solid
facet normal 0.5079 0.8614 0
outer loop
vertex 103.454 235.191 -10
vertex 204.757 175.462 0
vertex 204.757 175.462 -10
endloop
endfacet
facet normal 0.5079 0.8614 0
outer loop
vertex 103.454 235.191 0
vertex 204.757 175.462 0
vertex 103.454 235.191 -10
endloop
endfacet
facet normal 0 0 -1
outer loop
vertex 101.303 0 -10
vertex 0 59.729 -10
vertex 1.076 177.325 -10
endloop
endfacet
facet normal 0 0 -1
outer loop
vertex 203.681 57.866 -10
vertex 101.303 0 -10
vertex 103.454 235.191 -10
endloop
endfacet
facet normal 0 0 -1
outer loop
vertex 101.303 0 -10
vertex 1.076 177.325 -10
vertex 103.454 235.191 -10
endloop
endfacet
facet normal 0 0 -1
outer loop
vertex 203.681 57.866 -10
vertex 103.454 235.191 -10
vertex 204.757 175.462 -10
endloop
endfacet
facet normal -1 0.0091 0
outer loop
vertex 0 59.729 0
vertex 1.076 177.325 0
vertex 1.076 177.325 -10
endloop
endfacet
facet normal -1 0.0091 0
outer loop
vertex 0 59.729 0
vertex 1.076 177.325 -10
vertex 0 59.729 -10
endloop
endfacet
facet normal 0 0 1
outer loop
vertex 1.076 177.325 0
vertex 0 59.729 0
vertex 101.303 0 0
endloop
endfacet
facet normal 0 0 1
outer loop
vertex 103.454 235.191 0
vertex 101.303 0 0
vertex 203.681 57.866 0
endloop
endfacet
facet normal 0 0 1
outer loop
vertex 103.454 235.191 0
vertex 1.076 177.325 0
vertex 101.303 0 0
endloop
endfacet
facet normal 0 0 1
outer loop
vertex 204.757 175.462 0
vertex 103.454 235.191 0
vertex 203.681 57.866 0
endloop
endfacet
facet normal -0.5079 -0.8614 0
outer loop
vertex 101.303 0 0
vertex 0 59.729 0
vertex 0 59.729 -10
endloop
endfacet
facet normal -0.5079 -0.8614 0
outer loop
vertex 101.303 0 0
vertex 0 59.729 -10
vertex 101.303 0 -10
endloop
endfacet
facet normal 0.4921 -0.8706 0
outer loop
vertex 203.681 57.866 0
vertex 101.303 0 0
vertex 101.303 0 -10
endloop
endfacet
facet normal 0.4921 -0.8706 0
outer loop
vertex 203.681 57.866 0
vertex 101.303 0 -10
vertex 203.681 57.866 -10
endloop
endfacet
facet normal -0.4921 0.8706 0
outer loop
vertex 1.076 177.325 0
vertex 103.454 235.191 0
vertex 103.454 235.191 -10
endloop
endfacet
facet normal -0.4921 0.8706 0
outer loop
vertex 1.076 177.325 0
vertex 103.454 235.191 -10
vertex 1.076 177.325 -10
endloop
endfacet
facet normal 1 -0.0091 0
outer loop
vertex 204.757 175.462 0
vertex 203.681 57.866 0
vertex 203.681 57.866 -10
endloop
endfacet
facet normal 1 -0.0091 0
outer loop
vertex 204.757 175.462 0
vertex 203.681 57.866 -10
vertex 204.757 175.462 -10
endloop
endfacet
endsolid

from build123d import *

# Parameters (mm, degrees)
PAD013_DEPTH = 10


with BuildPart() as part:
    # Sketch013 → Pad013 (new body)
    with BuildSketch(Plane.XY):
        Polygon((40.648041, 7.960721), (-60.654729, 67.690055), (-163.033235, 9.82395), (-164.108971, -107.771489), (-62.806201, -167.500823), (39.572305, -109.634718), align=None)
    extrude(amount=-PAD013_DEPTH)


with BuildPart() as part_1:
    # Body013 placement: moved
    add(part.part.moved(Location((164.108971, 167.500823, 0))))


solid = part_1.part
